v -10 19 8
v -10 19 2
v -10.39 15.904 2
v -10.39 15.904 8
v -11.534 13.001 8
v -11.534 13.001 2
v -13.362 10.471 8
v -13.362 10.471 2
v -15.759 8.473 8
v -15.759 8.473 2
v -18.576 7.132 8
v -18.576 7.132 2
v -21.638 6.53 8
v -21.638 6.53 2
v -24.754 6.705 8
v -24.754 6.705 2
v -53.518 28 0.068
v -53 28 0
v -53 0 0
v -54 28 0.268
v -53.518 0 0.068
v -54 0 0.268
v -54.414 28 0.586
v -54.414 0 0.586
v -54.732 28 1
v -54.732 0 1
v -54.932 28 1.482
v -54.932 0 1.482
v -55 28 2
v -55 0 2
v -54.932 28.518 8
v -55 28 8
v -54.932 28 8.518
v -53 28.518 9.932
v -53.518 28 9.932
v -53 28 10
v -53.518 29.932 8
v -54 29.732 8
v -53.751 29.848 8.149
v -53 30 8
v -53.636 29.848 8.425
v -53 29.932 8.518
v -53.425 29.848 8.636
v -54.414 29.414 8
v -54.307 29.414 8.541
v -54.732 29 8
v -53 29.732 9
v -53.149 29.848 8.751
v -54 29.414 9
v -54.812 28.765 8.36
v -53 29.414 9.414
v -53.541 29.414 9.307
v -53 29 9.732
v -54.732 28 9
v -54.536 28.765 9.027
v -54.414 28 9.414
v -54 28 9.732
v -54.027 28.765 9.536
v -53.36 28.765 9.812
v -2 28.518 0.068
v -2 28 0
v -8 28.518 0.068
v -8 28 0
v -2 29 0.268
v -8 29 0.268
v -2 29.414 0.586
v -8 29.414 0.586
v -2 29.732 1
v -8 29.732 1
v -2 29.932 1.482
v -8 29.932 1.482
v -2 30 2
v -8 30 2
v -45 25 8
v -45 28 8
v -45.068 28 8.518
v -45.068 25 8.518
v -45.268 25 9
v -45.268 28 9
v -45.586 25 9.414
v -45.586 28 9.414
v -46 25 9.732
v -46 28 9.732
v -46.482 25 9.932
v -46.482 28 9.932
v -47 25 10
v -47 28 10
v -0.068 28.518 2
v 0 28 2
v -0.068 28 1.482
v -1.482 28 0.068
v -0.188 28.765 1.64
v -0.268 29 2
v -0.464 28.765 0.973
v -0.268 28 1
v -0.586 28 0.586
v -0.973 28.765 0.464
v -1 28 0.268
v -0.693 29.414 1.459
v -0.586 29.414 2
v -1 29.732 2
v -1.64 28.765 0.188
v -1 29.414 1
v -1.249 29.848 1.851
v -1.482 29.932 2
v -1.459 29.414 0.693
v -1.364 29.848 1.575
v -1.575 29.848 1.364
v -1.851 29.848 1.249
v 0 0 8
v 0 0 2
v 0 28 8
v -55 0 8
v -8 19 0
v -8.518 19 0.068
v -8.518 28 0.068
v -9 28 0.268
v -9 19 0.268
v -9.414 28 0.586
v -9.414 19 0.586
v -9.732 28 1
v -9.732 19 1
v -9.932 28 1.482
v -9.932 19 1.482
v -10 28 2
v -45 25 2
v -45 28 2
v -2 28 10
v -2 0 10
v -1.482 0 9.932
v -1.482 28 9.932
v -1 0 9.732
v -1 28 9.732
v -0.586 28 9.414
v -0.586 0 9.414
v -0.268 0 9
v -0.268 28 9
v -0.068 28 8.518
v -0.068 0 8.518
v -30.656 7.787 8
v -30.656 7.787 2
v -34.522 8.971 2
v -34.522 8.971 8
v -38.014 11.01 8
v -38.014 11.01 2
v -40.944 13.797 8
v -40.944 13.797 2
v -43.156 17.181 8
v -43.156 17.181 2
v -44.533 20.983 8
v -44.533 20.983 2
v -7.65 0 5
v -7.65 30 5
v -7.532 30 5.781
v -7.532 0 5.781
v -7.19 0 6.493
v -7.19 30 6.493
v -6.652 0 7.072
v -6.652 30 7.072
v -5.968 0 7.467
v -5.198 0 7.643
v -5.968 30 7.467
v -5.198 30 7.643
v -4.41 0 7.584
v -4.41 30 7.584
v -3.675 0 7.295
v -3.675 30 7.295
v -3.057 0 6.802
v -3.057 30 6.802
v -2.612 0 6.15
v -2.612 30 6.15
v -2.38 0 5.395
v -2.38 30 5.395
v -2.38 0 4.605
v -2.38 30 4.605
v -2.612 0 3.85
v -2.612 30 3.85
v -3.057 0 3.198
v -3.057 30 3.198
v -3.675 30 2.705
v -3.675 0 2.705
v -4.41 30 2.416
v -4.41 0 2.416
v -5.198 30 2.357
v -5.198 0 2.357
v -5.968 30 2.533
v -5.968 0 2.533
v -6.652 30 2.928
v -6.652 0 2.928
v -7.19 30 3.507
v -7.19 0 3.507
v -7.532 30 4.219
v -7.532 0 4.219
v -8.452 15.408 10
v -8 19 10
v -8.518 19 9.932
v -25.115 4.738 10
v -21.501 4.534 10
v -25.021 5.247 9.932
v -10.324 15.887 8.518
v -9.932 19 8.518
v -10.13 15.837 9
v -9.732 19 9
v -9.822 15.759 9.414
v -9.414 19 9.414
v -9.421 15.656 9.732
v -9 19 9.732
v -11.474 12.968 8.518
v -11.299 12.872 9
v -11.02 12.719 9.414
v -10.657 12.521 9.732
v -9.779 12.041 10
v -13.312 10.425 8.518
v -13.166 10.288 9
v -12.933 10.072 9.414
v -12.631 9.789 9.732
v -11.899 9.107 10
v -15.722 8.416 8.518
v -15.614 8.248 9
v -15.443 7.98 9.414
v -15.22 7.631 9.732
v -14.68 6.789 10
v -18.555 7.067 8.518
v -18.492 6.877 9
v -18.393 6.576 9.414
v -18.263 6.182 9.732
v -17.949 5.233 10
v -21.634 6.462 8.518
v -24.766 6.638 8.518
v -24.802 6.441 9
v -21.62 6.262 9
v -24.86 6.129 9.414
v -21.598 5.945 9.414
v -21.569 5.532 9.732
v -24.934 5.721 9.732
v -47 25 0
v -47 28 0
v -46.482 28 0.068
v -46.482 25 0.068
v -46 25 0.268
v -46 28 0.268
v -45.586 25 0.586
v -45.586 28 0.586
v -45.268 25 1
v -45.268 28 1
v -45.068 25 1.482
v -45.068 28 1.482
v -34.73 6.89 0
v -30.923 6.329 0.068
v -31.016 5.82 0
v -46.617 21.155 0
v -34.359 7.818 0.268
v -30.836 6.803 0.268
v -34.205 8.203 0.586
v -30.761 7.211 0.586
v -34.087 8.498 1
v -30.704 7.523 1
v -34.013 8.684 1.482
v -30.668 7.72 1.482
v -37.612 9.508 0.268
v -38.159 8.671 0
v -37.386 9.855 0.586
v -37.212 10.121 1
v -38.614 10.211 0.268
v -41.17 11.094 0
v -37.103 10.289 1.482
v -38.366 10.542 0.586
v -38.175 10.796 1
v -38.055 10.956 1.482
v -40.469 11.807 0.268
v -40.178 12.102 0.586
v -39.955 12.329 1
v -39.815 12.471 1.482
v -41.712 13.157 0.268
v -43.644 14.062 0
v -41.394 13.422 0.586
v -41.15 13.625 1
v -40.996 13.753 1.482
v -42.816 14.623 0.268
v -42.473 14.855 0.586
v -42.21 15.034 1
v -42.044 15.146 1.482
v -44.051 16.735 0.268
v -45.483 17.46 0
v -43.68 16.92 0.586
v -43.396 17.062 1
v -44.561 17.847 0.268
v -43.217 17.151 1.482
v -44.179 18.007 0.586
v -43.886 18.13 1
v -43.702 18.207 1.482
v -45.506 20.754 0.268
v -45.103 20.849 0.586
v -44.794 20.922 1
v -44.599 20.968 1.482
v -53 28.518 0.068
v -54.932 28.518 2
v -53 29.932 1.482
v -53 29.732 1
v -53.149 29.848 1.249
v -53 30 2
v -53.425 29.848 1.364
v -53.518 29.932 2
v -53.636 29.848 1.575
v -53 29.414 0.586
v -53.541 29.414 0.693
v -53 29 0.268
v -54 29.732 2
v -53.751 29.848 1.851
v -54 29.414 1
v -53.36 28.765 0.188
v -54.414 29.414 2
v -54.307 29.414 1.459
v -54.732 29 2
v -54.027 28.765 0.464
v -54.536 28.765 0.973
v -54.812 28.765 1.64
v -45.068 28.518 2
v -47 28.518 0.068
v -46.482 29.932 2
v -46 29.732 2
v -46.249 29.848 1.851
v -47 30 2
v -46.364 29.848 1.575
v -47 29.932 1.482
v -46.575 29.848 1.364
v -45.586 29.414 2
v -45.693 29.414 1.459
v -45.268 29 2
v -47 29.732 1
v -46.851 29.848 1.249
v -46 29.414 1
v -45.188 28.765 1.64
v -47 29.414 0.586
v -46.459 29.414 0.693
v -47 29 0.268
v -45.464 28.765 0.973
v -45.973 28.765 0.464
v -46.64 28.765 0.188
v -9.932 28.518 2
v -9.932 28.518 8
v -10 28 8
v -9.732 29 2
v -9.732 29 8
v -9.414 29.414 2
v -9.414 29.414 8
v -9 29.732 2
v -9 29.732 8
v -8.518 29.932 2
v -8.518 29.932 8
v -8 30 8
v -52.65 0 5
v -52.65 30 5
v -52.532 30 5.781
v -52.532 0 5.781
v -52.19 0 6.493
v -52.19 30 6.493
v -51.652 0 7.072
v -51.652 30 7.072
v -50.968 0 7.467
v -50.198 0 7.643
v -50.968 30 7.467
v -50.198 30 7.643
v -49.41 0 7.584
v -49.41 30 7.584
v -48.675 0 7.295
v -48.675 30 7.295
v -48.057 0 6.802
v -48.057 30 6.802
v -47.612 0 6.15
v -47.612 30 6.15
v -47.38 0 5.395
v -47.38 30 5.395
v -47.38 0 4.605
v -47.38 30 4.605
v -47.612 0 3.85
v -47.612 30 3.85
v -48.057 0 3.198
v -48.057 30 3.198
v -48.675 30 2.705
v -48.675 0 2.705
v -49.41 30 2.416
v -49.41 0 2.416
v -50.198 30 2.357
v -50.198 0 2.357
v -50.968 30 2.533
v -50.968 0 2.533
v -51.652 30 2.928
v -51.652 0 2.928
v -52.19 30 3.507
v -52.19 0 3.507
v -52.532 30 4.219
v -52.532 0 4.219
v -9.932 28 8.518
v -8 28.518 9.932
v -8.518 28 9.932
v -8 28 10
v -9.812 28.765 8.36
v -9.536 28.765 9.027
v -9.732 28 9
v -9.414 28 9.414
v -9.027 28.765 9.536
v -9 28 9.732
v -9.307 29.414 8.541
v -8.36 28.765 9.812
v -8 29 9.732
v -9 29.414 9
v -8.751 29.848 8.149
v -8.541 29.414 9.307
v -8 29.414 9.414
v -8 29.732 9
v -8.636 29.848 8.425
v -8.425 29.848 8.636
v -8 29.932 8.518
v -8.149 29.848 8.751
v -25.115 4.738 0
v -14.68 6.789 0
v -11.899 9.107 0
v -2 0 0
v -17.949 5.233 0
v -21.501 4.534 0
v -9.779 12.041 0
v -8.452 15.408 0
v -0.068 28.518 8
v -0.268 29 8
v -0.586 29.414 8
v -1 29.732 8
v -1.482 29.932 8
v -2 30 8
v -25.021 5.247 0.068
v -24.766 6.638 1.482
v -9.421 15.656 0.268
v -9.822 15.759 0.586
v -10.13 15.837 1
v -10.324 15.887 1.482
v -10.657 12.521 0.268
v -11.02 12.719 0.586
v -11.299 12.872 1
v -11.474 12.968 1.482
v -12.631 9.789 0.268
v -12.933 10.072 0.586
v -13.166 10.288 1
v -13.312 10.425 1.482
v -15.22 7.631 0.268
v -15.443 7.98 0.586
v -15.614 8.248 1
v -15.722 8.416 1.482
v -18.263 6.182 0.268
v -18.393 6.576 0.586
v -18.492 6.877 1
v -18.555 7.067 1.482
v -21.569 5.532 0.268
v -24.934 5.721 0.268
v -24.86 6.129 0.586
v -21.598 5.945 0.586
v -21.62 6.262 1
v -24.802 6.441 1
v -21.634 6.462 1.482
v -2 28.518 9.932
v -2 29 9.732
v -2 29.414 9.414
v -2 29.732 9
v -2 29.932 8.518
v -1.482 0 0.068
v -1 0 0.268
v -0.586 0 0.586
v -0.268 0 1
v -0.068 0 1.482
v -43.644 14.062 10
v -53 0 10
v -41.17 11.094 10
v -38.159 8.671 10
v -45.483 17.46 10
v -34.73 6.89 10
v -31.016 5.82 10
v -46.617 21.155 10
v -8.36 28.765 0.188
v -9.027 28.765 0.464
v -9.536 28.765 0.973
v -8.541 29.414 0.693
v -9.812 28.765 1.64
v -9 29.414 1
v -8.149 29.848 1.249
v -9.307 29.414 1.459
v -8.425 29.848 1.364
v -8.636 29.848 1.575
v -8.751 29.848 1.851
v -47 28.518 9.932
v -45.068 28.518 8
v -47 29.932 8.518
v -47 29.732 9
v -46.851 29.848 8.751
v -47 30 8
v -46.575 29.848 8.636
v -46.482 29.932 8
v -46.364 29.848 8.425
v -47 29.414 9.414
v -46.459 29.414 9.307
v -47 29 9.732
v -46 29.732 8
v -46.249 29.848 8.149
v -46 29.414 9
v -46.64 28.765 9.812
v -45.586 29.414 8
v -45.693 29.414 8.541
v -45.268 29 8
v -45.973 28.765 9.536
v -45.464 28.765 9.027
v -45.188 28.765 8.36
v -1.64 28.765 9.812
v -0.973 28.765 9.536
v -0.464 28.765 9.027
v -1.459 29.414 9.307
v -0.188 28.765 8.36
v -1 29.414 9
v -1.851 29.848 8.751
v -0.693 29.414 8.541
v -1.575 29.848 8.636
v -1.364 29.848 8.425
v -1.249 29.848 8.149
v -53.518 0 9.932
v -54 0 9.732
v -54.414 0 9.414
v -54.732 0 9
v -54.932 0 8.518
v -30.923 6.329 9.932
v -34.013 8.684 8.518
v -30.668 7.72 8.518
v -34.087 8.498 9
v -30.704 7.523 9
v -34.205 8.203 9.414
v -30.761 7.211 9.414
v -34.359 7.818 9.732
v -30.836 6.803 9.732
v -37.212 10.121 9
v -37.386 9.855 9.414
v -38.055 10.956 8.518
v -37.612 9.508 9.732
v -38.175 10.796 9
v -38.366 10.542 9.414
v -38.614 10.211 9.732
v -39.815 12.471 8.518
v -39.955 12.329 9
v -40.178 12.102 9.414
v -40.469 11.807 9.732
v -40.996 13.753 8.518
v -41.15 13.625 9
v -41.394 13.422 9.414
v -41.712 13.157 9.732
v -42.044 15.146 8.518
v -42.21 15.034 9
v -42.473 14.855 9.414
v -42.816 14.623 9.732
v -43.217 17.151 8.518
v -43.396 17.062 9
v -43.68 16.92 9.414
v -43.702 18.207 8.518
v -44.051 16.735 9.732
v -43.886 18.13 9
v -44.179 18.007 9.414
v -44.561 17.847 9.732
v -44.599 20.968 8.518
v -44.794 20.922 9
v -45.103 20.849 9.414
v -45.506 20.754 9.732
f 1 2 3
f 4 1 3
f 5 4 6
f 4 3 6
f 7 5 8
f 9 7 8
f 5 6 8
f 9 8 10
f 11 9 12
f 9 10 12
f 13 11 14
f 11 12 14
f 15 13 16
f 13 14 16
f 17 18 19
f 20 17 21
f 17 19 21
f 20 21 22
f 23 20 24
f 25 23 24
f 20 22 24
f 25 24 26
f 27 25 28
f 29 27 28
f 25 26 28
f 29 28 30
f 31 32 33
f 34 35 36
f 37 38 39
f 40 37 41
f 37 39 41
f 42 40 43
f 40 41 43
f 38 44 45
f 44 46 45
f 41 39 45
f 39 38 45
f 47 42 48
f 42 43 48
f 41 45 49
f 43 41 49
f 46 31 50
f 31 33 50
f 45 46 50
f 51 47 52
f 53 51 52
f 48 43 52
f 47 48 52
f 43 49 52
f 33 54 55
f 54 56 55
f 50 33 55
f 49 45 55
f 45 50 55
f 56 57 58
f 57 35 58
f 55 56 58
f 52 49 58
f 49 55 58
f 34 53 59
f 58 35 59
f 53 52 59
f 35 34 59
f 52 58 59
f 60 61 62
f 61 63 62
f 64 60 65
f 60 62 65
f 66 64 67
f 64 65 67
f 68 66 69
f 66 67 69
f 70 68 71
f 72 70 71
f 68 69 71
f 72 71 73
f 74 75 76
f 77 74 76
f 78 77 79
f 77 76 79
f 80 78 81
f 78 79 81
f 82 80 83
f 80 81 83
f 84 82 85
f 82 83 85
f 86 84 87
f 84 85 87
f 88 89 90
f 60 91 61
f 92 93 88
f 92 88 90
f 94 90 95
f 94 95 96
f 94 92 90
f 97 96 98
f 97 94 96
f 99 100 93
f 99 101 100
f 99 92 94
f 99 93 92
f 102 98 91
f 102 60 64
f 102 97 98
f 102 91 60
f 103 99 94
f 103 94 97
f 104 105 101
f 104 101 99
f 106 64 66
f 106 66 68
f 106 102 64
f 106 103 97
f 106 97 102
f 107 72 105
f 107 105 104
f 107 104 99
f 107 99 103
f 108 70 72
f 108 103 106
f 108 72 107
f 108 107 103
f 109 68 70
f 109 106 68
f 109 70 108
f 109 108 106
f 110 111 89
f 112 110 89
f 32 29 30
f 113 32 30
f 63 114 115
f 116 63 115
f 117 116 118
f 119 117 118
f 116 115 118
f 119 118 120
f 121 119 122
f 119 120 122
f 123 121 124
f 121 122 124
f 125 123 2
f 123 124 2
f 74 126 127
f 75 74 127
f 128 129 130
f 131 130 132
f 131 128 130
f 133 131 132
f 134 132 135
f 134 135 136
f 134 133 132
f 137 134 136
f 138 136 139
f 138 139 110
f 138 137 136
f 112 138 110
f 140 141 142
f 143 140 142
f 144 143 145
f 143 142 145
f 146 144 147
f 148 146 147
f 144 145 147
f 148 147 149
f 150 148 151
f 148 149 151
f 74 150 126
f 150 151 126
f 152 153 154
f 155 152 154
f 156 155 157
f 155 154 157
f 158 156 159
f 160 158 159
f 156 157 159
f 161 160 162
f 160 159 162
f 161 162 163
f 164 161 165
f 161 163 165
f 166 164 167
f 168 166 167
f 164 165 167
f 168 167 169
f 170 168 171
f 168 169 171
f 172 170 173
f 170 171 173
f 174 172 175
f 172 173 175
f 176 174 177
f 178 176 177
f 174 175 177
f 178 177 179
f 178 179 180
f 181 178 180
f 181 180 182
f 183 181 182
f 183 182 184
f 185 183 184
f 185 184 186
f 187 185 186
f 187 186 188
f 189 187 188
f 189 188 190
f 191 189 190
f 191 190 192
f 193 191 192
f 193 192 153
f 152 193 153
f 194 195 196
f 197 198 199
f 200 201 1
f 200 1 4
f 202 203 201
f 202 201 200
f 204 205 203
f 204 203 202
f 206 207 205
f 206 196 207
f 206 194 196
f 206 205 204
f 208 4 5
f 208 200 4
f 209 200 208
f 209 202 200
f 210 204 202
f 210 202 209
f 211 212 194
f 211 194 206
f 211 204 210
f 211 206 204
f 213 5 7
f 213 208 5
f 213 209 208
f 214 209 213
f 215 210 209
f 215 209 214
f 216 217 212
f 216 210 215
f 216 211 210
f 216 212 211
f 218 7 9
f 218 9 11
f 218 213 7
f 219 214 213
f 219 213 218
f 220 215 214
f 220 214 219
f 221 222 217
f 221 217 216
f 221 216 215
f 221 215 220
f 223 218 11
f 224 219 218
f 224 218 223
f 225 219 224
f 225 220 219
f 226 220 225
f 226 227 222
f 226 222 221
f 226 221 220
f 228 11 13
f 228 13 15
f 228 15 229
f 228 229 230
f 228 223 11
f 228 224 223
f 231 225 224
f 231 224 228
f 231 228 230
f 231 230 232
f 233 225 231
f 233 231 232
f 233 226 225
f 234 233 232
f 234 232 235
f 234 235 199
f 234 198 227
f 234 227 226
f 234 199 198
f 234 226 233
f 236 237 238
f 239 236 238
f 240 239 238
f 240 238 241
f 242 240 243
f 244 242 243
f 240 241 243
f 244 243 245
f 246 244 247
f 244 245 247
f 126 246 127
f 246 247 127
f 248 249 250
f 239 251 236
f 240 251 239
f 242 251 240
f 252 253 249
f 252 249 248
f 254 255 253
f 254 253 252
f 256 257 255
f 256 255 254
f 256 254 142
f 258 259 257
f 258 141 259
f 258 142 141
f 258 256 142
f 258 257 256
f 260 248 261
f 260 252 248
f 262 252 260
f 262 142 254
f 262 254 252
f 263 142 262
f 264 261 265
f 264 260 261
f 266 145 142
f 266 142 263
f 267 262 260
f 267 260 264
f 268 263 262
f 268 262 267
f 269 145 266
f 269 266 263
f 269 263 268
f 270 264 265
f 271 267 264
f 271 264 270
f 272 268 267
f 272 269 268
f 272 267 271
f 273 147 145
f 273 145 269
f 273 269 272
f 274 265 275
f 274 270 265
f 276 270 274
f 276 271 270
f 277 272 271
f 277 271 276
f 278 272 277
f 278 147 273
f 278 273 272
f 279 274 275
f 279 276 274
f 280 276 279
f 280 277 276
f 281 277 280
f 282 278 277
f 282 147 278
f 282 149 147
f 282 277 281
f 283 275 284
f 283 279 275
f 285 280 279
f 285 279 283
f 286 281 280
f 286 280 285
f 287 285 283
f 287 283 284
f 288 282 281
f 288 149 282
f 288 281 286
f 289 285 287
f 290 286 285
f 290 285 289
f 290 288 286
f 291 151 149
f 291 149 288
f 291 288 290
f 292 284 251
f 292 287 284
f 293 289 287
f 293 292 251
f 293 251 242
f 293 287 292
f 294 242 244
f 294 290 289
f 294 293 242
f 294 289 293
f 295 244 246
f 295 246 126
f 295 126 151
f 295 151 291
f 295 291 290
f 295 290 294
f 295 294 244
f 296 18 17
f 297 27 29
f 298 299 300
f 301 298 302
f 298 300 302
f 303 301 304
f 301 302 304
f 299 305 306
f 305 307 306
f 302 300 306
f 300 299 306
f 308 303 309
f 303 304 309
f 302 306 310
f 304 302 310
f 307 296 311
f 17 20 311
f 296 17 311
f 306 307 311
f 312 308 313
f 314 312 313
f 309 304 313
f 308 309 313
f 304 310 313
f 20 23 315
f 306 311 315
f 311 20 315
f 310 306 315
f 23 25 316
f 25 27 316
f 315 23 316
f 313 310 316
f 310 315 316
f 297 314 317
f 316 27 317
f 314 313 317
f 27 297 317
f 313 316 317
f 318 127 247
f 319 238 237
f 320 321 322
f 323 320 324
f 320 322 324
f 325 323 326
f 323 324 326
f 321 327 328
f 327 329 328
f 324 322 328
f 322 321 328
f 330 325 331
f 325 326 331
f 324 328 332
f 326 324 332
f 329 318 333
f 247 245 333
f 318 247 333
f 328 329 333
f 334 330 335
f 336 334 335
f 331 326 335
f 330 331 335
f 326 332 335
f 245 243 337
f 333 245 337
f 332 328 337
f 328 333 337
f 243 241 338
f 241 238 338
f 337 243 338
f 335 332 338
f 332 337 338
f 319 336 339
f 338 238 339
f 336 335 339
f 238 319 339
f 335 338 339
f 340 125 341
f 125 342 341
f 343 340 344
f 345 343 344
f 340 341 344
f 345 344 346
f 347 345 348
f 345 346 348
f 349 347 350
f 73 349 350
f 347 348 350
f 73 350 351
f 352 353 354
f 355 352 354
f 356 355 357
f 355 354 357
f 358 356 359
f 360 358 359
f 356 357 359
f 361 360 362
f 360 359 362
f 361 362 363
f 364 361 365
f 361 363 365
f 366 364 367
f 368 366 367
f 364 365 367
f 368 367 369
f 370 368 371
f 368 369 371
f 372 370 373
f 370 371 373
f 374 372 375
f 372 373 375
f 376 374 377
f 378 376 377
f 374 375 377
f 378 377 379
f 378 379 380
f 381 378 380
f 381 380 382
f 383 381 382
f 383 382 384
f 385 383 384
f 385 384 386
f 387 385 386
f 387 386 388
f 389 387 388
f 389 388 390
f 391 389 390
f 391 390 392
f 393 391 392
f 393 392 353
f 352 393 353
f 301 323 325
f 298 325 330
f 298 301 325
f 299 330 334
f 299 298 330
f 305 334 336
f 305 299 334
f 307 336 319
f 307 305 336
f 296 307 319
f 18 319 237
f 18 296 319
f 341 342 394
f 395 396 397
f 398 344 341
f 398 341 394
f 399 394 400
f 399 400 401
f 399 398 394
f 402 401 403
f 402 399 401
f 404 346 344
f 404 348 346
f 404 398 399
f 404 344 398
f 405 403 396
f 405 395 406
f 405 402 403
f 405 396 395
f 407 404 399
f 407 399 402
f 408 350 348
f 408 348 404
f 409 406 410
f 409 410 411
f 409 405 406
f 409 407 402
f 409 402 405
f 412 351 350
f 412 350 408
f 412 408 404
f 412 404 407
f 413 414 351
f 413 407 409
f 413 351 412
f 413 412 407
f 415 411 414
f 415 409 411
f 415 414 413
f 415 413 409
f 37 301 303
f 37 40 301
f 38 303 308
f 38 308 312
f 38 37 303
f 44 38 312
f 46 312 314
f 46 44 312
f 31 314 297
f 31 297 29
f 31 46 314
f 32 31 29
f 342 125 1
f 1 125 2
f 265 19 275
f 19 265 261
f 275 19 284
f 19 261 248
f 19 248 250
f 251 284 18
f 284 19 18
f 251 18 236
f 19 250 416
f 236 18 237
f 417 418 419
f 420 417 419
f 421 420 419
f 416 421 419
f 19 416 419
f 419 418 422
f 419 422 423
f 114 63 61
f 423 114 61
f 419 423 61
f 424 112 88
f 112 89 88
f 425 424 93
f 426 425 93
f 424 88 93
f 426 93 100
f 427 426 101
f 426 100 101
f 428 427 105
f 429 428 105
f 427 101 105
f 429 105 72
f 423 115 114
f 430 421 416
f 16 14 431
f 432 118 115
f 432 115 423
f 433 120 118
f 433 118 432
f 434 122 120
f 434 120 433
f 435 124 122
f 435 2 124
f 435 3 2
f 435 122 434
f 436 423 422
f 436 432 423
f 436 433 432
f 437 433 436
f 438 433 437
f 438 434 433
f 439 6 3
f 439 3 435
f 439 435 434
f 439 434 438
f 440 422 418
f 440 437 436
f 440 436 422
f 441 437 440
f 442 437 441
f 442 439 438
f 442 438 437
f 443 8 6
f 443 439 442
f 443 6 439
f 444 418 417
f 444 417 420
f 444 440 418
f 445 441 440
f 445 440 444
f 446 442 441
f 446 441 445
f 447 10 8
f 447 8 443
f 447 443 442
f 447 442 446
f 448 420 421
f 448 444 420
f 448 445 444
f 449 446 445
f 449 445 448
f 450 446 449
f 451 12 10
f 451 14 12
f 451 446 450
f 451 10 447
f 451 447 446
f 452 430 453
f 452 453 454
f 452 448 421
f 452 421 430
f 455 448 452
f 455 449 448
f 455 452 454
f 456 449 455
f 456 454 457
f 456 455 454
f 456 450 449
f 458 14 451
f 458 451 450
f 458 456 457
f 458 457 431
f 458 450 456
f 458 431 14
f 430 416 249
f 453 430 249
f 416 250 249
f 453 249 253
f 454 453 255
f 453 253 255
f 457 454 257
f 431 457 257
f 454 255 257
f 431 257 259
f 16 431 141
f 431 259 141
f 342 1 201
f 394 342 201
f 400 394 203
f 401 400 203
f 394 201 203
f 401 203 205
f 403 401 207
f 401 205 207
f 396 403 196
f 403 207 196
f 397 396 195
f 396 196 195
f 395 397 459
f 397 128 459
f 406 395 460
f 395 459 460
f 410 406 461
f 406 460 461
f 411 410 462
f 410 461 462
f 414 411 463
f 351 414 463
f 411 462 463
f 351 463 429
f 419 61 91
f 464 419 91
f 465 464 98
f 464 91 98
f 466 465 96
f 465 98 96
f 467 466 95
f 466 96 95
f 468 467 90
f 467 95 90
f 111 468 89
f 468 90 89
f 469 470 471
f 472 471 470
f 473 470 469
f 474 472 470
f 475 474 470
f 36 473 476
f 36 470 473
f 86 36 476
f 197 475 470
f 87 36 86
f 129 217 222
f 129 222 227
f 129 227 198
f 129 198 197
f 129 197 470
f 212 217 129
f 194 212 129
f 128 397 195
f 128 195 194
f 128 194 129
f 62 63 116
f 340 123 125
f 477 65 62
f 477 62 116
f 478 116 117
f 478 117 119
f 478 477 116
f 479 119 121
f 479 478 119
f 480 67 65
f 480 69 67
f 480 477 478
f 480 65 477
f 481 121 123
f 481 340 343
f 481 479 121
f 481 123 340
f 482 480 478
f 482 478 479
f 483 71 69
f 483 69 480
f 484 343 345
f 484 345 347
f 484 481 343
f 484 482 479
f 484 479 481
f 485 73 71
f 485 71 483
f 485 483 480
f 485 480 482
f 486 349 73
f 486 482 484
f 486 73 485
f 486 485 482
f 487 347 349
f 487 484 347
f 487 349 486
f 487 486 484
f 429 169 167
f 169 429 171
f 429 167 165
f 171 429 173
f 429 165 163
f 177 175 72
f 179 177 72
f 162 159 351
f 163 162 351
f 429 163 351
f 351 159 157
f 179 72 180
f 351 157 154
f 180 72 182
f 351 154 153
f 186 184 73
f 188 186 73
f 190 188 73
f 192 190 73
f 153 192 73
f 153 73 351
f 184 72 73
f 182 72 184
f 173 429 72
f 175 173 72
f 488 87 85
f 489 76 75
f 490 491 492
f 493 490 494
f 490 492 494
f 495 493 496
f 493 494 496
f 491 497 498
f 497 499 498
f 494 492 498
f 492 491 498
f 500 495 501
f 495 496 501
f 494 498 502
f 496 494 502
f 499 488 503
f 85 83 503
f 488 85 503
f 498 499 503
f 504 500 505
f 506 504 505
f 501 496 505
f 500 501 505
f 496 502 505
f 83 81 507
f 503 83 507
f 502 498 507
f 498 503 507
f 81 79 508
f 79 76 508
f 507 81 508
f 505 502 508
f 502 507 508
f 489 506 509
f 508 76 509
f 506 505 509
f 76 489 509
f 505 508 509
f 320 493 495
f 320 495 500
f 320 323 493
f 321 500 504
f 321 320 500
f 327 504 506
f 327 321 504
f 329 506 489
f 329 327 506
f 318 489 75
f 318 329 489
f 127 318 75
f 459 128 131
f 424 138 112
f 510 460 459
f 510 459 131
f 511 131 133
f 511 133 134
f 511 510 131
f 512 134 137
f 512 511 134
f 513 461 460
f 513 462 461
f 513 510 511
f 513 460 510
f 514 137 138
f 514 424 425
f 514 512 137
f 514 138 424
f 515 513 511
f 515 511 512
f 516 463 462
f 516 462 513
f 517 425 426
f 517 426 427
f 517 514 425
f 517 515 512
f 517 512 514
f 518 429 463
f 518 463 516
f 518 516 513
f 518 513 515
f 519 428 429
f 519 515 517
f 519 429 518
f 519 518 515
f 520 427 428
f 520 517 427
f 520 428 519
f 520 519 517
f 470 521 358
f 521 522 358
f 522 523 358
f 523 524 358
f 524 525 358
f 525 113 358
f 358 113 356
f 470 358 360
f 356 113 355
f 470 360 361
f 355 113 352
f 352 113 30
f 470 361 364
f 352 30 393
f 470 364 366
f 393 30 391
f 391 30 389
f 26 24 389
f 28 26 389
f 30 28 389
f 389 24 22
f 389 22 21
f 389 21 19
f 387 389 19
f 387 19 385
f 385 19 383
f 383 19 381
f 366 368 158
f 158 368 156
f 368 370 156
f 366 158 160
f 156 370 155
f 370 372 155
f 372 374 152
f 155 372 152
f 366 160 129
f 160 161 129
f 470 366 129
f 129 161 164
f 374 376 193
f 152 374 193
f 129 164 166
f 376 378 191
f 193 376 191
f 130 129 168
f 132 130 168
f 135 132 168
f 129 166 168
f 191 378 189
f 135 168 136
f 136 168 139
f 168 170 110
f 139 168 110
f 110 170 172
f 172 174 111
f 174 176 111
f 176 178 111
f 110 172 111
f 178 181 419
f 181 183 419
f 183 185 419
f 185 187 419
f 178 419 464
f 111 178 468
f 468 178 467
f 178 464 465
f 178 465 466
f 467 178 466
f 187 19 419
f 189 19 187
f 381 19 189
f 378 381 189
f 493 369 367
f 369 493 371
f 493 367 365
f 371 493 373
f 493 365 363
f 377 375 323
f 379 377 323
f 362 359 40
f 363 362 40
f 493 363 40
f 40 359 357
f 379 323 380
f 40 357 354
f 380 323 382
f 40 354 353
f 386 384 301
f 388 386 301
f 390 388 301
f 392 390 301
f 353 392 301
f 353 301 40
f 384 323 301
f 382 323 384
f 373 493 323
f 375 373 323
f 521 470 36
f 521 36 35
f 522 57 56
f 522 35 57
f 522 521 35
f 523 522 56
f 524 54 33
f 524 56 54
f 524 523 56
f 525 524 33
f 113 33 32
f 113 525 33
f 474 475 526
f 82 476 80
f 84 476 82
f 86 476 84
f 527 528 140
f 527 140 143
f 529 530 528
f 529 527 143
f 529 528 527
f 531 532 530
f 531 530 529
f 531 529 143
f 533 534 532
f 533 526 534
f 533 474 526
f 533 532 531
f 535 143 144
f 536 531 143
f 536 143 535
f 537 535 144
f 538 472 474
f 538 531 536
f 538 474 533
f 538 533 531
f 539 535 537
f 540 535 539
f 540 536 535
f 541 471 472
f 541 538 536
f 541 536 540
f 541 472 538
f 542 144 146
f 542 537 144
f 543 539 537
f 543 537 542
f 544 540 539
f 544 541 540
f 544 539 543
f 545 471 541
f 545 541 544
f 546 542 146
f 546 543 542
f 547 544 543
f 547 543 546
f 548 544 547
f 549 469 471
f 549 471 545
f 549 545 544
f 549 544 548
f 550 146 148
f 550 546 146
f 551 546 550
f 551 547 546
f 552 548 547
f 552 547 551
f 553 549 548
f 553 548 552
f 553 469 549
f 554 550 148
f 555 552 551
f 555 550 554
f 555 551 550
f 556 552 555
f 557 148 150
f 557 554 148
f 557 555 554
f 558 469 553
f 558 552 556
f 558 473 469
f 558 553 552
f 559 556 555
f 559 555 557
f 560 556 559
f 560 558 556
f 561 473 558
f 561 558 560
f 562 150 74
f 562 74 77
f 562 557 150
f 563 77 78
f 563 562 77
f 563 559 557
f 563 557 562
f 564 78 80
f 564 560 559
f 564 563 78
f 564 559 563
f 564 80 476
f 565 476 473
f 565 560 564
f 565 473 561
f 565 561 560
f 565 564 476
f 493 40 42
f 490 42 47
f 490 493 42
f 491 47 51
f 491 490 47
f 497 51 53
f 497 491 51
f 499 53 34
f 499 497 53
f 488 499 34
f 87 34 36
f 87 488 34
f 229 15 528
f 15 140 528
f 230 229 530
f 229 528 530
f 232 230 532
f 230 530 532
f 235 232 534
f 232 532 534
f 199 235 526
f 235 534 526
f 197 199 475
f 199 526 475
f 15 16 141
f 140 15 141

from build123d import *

# Parameters (mm, degrees)
F1_DEPTH = 10
F2_R     = 2.65
F3_DEPTH = 30.001
F4_DEPTH = 30.001
F5_R     = 2
F6_R     = 2


with BuildPart() as f1:
    # F0 (on Top) → F1 (new body)
    with BuildSketch(Plane.XY):
        with BuildLine():
            Line((-10, 30), (-10, 19))
            ThreePointArc((-10, 19), (-14.497695, 9.397234), (-24.754098, 6.704918))
            Line((-24.754098, 6.704918), (-30.655738, 7.786885))
            ThreePointArc((-30.655738, 7.786885), (-40.943872, 13.796773), (-45, 25))
            Line((-45, 25), (-45, 30))
            Line((-45, 30), (-55, 30))
            Line((-55, 30), (-55, 0))
            Line((-55, 0), (0, 0))
            Line((0, 0), (0, 30))
            Line((0, 30), (-10, 30))
        make_face()
    extrude(amount=F1_DEPTH)

    # F2 (on face) → F3 (cut, through all)
    with BuildSketch(Plane(origin=(0, 30, 0), x_dir=(-1, 0, 0), z_dir=(0, 1, 0))):
        with Locations((50, 5)):
            Circle(F2_R)
    extrude(amount=-F3_DEPTH, mode=Mode.SUBTRACT)

    # F2 (on face) → F4 (cut, through all)
    with BuildSketch(Plane(origin=(0, 30, 0), x_dir=(-1, 0, 0), z_dir=(0, 1, 0))):
        with Locations((5, 5)):
            Circle(F2_R)
    extrude(amount=-F4_DEPTH, mode=Mode.SUBTRACT)

    # F5
    f5_edges = [f1.edges().sort_by_distance(p)[0] for p in [
        (-55, 15, 10),
        (0, 15, 10),
        (0, 15, 0),
        (-55, 15, 0),
        (-40.943872, 13.796773, 0),
        (-14.497695, 9.397234, 10),
    ]]
    fillet(f5_edges, radius=F5_R)

    # F6
    f6_edges = [f1.edges().sort_by_distance(p)[0] for p in [
        (-10, 30, 5),
        (-55, 30, 5),
    ]]
    fillet(f6_edges, radius=F6_R)


solid = f1.part
